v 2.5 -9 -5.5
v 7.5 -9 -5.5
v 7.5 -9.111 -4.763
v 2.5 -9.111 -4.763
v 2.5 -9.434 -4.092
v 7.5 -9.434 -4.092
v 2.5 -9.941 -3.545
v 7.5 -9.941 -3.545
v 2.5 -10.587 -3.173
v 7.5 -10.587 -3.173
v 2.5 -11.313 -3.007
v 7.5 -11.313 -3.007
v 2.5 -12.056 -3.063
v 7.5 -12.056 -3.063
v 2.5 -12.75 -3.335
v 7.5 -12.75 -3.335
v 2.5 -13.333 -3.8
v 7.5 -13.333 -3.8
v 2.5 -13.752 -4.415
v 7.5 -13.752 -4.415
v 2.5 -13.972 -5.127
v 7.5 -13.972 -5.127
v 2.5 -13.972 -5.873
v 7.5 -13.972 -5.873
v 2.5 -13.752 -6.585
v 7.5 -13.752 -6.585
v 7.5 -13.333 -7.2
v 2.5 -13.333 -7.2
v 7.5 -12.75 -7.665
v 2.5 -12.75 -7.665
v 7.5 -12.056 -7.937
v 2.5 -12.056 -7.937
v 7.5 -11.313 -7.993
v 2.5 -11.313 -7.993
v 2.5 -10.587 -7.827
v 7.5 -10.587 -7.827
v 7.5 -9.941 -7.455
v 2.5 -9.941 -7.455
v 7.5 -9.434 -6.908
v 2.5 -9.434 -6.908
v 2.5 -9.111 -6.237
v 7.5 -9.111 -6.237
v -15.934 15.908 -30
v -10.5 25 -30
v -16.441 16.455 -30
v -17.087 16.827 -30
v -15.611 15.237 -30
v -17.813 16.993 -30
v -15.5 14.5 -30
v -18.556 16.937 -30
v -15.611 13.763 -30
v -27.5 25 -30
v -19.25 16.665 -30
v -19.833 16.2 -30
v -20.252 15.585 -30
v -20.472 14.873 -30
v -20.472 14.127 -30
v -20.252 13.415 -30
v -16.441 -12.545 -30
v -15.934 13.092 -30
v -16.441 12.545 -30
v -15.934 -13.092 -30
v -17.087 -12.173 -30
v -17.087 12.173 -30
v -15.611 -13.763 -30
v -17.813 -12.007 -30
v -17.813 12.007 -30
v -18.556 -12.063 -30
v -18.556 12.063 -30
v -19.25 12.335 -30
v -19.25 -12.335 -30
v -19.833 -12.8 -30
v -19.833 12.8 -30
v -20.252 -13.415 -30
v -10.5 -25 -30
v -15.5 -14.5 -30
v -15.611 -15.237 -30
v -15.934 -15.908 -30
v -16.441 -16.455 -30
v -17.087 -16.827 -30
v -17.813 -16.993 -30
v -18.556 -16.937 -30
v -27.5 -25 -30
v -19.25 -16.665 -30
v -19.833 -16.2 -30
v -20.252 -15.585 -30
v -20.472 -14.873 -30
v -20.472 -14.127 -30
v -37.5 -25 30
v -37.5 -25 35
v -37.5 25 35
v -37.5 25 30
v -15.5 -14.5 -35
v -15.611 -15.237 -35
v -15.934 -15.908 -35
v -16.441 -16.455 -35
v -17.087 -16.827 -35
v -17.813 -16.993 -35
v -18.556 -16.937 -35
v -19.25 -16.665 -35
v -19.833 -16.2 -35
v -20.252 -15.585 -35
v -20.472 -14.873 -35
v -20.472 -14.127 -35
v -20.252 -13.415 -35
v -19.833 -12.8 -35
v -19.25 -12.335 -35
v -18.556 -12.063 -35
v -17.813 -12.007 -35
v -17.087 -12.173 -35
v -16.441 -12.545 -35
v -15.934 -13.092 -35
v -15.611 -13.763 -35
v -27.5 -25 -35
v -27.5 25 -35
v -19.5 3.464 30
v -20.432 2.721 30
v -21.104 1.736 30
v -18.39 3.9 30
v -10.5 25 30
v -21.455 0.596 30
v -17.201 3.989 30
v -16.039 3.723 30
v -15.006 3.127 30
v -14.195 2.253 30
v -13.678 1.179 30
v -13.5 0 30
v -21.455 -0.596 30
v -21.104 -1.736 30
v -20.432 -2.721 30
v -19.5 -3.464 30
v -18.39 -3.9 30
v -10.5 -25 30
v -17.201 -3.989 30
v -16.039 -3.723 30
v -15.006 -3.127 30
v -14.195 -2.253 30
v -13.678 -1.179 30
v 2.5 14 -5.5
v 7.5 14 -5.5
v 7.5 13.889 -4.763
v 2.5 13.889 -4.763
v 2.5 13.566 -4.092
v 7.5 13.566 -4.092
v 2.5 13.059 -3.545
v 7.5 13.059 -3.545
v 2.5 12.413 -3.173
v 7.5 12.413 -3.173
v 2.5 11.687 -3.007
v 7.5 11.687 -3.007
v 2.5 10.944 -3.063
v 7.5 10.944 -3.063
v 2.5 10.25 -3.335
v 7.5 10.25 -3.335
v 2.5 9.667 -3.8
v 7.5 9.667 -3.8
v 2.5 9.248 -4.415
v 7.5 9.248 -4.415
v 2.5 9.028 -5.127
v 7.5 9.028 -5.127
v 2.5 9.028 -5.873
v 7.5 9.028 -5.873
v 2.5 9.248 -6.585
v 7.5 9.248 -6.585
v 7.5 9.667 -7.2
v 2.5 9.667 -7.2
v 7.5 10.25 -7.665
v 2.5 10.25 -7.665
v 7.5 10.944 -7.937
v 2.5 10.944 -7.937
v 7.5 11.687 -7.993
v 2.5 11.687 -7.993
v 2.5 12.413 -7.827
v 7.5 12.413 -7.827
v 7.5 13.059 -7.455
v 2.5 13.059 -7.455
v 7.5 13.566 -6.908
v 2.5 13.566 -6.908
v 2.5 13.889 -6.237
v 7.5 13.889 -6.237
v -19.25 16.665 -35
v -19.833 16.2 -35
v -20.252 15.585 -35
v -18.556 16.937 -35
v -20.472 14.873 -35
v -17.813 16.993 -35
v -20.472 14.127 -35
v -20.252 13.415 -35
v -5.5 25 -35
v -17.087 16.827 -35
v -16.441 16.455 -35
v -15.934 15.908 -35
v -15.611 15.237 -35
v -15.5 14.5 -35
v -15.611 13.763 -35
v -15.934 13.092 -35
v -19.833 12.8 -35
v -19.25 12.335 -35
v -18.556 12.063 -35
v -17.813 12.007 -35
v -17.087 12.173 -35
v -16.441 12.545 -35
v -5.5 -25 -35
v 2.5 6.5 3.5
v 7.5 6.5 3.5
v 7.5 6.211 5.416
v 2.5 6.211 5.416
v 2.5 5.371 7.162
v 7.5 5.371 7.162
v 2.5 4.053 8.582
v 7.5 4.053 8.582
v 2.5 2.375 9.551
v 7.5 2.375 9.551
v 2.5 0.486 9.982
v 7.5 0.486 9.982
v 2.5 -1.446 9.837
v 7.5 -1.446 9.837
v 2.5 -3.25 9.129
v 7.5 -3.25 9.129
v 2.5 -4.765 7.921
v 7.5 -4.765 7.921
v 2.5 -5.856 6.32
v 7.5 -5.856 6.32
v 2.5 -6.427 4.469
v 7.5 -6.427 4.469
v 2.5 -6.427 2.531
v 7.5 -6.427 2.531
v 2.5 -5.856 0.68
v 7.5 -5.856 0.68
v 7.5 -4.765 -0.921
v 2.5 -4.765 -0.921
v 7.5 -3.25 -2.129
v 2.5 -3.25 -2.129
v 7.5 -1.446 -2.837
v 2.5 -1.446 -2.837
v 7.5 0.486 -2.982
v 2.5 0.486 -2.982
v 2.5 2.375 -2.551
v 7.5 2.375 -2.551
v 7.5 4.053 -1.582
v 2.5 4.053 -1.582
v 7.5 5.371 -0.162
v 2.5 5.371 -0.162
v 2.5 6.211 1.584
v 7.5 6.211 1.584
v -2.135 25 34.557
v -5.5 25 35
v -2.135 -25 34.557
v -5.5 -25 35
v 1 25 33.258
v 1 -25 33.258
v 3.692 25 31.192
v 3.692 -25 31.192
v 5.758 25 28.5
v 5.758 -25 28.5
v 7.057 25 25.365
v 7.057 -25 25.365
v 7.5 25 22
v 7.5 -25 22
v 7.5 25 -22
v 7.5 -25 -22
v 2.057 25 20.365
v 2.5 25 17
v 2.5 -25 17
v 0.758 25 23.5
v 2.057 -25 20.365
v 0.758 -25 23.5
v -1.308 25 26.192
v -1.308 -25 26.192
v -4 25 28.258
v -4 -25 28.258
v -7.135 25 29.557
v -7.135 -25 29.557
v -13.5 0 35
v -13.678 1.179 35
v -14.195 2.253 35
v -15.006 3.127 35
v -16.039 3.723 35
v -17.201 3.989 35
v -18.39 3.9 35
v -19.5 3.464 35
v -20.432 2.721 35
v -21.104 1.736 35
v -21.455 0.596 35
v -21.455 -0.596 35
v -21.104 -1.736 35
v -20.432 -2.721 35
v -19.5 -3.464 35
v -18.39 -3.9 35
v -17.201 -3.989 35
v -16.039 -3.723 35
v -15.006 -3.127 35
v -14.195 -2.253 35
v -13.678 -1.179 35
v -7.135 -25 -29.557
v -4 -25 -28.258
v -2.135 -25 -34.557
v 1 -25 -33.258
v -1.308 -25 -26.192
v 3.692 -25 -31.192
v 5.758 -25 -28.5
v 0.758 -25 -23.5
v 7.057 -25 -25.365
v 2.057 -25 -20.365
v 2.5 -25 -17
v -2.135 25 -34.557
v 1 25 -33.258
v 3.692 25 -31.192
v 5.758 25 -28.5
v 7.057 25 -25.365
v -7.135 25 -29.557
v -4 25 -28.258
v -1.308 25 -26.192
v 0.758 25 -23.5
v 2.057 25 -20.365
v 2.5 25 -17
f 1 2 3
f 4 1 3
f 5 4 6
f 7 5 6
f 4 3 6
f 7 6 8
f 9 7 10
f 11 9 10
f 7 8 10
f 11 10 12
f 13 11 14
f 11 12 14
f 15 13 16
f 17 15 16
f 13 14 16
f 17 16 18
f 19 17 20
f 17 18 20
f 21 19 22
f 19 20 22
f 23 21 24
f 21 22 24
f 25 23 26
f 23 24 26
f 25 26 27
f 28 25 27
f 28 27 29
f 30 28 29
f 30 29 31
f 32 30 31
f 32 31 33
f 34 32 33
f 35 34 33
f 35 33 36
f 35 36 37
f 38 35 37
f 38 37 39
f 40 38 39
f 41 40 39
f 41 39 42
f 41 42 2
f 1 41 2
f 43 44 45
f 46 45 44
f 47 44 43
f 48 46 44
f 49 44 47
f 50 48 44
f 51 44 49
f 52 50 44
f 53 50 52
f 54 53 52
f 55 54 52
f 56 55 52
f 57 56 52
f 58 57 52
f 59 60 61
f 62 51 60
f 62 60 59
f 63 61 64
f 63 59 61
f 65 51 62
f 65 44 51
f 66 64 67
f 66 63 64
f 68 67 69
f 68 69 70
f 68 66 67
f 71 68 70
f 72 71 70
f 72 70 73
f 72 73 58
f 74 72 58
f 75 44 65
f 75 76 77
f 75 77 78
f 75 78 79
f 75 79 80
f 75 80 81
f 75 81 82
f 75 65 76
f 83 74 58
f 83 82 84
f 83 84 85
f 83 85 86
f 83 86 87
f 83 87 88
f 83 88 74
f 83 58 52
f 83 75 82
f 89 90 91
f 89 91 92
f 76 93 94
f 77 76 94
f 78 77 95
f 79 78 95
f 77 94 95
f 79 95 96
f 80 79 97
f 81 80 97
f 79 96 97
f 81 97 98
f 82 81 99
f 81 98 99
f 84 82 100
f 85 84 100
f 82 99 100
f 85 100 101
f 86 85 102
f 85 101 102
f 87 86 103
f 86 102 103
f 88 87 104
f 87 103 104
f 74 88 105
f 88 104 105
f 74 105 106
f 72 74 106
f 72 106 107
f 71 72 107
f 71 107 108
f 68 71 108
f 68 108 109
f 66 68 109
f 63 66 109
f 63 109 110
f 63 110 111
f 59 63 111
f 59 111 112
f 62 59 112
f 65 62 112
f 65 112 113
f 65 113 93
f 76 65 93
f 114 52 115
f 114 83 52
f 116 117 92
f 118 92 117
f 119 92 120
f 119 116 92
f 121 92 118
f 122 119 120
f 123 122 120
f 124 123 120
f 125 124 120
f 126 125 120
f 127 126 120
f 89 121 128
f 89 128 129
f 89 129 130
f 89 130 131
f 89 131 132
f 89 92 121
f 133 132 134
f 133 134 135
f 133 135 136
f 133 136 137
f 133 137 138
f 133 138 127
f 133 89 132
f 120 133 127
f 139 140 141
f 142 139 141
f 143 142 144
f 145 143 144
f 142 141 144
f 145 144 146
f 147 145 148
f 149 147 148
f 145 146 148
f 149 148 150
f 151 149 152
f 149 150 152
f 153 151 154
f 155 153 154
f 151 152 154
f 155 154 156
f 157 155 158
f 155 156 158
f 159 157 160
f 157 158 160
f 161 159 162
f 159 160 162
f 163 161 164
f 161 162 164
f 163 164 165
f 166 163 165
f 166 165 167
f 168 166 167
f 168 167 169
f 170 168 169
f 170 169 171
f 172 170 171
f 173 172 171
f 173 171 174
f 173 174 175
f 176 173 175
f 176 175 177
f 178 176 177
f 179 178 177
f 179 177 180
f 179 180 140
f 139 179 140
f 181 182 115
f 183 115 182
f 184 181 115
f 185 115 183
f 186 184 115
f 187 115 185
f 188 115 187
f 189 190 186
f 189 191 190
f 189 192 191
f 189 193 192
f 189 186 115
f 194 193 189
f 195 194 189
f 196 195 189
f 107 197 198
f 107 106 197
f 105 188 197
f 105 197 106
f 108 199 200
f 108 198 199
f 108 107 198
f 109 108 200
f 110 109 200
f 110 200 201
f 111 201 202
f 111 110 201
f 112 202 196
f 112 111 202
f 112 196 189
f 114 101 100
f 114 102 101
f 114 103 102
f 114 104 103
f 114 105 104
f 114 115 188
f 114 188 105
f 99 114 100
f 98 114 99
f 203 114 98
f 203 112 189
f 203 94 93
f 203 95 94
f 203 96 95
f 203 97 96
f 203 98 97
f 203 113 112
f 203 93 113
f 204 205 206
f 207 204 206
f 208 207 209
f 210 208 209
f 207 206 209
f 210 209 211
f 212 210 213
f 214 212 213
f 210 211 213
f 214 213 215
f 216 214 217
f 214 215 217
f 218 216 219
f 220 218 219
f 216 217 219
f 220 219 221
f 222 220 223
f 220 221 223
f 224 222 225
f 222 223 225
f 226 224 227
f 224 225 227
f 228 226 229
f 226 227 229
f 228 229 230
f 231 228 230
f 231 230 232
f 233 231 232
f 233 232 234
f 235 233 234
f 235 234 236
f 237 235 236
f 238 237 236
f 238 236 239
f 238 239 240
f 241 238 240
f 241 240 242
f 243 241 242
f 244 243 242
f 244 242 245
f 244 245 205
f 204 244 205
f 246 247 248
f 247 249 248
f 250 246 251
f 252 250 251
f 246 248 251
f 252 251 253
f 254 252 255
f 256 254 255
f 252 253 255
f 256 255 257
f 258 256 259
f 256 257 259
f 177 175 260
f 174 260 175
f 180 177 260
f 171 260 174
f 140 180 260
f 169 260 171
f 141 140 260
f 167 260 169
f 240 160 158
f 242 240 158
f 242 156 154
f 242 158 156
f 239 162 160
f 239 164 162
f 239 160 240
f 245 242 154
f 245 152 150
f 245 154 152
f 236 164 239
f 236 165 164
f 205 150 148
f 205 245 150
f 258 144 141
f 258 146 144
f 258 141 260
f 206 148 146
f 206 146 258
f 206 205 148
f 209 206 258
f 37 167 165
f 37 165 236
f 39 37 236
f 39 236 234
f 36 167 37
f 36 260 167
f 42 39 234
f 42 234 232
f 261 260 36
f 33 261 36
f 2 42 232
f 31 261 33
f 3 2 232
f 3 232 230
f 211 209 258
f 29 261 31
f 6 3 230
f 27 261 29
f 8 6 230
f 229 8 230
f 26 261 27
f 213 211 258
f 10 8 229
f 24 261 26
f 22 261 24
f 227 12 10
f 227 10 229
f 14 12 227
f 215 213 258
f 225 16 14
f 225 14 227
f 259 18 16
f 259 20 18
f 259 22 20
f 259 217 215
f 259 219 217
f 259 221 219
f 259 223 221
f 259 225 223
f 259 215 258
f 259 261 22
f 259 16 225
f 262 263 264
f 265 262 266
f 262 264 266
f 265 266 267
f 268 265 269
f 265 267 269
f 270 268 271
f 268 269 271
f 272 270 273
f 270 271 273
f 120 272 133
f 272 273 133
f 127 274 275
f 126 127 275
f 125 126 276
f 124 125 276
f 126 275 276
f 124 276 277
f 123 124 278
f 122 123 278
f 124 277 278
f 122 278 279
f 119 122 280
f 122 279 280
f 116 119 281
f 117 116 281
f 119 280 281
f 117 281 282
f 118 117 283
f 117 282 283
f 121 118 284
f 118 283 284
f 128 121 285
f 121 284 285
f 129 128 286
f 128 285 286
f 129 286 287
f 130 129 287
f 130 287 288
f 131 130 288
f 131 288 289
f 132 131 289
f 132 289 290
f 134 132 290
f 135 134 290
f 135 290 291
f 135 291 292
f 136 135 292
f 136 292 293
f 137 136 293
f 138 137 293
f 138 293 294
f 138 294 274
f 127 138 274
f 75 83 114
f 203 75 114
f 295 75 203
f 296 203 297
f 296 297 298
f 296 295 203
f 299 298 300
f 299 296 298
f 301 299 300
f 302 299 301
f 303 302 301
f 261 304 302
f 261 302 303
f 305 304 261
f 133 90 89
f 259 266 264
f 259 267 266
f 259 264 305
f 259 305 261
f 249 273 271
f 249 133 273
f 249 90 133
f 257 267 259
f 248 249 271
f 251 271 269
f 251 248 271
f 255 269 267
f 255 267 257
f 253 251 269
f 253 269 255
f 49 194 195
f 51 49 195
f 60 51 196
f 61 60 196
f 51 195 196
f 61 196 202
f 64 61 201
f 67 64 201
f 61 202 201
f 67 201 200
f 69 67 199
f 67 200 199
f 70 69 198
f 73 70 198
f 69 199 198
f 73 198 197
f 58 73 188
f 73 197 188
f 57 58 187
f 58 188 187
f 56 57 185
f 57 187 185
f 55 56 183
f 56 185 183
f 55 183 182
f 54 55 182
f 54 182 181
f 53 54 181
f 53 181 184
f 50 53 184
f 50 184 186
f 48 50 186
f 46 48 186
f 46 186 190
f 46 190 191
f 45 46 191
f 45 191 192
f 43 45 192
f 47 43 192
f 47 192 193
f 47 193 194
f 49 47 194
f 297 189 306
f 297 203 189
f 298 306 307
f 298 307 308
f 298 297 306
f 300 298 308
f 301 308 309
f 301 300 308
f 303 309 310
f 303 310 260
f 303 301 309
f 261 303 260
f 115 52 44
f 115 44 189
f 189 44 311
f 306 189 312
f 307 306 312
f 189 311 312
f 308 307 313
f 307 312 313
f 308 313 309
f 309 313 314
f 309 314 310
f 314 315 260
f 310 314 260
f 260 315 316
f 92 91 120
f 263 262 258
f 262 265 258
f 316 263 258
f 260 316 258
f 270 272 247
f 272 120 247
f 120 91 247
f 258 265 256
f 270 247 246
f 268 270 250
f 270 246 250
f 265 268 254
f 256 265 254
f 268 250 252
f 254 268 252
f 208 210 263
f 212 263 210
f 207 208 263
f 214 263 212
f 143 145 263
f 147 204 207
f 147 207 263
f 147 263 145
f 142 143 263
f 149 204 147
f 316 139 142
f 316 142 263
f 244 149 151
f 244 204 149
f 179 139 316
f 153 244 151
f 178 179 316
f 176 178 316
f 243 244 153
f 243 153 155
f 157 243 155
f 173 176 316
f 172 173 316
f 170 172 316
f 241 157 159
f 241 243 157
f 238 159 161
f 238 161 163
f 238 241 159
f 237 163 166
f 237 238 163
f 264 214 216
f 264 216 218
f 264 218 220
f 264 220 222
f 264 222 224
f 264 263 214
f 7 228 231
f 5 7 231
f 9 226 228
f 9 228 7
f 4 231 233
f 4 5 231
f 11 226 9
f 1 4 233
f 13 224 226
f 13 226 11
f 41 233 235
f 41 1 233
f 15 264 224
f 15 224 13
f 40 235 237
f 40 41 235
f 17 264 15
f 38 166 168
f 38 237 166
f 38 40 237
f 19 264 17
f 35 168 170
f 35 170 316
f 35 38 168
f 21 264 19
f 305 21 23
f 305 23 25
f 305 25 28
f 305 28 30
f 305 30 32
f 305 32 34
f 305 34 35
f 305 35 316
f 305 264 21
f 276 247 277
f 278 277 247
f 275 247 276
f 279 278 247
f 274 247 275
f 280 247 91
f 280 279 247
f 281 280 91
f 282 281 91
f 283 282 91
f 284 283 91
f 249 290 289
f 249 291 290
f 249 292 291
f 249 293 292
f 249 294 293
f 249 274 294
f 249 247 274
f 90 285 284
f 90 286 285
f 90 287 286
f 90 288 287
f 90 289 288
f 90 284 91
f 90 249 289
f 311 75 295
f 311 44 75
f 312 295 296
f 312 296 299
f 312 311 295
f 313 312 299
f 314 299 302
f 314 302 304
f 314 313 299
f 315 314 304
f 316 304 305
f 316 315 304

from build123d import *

# Parameters (mm, degrees)
F1_DEPTH      = 25
F1_DEPTH_BACK = 25
F2_R          = 13
F3_R          = 4
F4_DEPTH      = 10
F5_R          = 2.5
F6_DEPTH      = 10
F7_R          = 2.5
F7_R_2        = 6.5
F8_DEPTH      = 10


with BuildPart() as f1:
    # F0 (on Front) → F1 (new body, two sides)
    with BuildSketch(Plane.XZ) as f1_sk:
        Polygon((-27.5, -35), (7.5, -35), (7.5, 35), (-37.5, 35), (-37.5, 30), (2.5, 30), (2.5, -30), (-27.5, -30), align=None)
    extrude(amount=F1_DEPTH)
    extrude(f1_sk.sketch, amount=-F1_DEPTH_BACK)

    # F2
    f2_edges = [f1.edges().sort_by_distance(p)[0] for p in [
        (7.5, 0, 35),
        (7.5, 0, -35),
        (2.5, 0, -30),
        (2.5, 0, 30),
    ]]
    fillet(f2_edges, radius=F2_R)

    # F3 (on face) → F4 (cut)
    with BuildSketch(Plane.XY.offset(35)):
        with Locations((-17.5, 0)):
            Circle(F3_R)
    extrude(amount=-F4_DEPTH, mode=Mode.SUBTRACT)

    # F5 (on face) → F6 (cut)
    with BuildSketch(Plane(origin=(0, 0, -35), x_dir=(1, 0, 0), z_dir=(0, 0, -1))):
        with Locations((-18, -14.5)):
            Circle(F5_R)
        with Locations((-18, 14.5)):
            Circle(F5_R)
    extrude(amount=-F6_DEPTH, mode=Mode.SUBTRACT)

    # F7 (on face) → F8 (cut)
    with BuildSketch(Plane.YZ.offset(7.5)):
        with Locations((11.5, -5.5)):
            Circle(F7_R)
        with Locations((-11.5, -5.5)):
            Circle(F7_R)
        with Locations((0, 3.5)):
            Circle(F7_R_2)
    extrude(amount=-F8_DEPTH, mode=Mode.SUBTRACT)


solid = f1.part
